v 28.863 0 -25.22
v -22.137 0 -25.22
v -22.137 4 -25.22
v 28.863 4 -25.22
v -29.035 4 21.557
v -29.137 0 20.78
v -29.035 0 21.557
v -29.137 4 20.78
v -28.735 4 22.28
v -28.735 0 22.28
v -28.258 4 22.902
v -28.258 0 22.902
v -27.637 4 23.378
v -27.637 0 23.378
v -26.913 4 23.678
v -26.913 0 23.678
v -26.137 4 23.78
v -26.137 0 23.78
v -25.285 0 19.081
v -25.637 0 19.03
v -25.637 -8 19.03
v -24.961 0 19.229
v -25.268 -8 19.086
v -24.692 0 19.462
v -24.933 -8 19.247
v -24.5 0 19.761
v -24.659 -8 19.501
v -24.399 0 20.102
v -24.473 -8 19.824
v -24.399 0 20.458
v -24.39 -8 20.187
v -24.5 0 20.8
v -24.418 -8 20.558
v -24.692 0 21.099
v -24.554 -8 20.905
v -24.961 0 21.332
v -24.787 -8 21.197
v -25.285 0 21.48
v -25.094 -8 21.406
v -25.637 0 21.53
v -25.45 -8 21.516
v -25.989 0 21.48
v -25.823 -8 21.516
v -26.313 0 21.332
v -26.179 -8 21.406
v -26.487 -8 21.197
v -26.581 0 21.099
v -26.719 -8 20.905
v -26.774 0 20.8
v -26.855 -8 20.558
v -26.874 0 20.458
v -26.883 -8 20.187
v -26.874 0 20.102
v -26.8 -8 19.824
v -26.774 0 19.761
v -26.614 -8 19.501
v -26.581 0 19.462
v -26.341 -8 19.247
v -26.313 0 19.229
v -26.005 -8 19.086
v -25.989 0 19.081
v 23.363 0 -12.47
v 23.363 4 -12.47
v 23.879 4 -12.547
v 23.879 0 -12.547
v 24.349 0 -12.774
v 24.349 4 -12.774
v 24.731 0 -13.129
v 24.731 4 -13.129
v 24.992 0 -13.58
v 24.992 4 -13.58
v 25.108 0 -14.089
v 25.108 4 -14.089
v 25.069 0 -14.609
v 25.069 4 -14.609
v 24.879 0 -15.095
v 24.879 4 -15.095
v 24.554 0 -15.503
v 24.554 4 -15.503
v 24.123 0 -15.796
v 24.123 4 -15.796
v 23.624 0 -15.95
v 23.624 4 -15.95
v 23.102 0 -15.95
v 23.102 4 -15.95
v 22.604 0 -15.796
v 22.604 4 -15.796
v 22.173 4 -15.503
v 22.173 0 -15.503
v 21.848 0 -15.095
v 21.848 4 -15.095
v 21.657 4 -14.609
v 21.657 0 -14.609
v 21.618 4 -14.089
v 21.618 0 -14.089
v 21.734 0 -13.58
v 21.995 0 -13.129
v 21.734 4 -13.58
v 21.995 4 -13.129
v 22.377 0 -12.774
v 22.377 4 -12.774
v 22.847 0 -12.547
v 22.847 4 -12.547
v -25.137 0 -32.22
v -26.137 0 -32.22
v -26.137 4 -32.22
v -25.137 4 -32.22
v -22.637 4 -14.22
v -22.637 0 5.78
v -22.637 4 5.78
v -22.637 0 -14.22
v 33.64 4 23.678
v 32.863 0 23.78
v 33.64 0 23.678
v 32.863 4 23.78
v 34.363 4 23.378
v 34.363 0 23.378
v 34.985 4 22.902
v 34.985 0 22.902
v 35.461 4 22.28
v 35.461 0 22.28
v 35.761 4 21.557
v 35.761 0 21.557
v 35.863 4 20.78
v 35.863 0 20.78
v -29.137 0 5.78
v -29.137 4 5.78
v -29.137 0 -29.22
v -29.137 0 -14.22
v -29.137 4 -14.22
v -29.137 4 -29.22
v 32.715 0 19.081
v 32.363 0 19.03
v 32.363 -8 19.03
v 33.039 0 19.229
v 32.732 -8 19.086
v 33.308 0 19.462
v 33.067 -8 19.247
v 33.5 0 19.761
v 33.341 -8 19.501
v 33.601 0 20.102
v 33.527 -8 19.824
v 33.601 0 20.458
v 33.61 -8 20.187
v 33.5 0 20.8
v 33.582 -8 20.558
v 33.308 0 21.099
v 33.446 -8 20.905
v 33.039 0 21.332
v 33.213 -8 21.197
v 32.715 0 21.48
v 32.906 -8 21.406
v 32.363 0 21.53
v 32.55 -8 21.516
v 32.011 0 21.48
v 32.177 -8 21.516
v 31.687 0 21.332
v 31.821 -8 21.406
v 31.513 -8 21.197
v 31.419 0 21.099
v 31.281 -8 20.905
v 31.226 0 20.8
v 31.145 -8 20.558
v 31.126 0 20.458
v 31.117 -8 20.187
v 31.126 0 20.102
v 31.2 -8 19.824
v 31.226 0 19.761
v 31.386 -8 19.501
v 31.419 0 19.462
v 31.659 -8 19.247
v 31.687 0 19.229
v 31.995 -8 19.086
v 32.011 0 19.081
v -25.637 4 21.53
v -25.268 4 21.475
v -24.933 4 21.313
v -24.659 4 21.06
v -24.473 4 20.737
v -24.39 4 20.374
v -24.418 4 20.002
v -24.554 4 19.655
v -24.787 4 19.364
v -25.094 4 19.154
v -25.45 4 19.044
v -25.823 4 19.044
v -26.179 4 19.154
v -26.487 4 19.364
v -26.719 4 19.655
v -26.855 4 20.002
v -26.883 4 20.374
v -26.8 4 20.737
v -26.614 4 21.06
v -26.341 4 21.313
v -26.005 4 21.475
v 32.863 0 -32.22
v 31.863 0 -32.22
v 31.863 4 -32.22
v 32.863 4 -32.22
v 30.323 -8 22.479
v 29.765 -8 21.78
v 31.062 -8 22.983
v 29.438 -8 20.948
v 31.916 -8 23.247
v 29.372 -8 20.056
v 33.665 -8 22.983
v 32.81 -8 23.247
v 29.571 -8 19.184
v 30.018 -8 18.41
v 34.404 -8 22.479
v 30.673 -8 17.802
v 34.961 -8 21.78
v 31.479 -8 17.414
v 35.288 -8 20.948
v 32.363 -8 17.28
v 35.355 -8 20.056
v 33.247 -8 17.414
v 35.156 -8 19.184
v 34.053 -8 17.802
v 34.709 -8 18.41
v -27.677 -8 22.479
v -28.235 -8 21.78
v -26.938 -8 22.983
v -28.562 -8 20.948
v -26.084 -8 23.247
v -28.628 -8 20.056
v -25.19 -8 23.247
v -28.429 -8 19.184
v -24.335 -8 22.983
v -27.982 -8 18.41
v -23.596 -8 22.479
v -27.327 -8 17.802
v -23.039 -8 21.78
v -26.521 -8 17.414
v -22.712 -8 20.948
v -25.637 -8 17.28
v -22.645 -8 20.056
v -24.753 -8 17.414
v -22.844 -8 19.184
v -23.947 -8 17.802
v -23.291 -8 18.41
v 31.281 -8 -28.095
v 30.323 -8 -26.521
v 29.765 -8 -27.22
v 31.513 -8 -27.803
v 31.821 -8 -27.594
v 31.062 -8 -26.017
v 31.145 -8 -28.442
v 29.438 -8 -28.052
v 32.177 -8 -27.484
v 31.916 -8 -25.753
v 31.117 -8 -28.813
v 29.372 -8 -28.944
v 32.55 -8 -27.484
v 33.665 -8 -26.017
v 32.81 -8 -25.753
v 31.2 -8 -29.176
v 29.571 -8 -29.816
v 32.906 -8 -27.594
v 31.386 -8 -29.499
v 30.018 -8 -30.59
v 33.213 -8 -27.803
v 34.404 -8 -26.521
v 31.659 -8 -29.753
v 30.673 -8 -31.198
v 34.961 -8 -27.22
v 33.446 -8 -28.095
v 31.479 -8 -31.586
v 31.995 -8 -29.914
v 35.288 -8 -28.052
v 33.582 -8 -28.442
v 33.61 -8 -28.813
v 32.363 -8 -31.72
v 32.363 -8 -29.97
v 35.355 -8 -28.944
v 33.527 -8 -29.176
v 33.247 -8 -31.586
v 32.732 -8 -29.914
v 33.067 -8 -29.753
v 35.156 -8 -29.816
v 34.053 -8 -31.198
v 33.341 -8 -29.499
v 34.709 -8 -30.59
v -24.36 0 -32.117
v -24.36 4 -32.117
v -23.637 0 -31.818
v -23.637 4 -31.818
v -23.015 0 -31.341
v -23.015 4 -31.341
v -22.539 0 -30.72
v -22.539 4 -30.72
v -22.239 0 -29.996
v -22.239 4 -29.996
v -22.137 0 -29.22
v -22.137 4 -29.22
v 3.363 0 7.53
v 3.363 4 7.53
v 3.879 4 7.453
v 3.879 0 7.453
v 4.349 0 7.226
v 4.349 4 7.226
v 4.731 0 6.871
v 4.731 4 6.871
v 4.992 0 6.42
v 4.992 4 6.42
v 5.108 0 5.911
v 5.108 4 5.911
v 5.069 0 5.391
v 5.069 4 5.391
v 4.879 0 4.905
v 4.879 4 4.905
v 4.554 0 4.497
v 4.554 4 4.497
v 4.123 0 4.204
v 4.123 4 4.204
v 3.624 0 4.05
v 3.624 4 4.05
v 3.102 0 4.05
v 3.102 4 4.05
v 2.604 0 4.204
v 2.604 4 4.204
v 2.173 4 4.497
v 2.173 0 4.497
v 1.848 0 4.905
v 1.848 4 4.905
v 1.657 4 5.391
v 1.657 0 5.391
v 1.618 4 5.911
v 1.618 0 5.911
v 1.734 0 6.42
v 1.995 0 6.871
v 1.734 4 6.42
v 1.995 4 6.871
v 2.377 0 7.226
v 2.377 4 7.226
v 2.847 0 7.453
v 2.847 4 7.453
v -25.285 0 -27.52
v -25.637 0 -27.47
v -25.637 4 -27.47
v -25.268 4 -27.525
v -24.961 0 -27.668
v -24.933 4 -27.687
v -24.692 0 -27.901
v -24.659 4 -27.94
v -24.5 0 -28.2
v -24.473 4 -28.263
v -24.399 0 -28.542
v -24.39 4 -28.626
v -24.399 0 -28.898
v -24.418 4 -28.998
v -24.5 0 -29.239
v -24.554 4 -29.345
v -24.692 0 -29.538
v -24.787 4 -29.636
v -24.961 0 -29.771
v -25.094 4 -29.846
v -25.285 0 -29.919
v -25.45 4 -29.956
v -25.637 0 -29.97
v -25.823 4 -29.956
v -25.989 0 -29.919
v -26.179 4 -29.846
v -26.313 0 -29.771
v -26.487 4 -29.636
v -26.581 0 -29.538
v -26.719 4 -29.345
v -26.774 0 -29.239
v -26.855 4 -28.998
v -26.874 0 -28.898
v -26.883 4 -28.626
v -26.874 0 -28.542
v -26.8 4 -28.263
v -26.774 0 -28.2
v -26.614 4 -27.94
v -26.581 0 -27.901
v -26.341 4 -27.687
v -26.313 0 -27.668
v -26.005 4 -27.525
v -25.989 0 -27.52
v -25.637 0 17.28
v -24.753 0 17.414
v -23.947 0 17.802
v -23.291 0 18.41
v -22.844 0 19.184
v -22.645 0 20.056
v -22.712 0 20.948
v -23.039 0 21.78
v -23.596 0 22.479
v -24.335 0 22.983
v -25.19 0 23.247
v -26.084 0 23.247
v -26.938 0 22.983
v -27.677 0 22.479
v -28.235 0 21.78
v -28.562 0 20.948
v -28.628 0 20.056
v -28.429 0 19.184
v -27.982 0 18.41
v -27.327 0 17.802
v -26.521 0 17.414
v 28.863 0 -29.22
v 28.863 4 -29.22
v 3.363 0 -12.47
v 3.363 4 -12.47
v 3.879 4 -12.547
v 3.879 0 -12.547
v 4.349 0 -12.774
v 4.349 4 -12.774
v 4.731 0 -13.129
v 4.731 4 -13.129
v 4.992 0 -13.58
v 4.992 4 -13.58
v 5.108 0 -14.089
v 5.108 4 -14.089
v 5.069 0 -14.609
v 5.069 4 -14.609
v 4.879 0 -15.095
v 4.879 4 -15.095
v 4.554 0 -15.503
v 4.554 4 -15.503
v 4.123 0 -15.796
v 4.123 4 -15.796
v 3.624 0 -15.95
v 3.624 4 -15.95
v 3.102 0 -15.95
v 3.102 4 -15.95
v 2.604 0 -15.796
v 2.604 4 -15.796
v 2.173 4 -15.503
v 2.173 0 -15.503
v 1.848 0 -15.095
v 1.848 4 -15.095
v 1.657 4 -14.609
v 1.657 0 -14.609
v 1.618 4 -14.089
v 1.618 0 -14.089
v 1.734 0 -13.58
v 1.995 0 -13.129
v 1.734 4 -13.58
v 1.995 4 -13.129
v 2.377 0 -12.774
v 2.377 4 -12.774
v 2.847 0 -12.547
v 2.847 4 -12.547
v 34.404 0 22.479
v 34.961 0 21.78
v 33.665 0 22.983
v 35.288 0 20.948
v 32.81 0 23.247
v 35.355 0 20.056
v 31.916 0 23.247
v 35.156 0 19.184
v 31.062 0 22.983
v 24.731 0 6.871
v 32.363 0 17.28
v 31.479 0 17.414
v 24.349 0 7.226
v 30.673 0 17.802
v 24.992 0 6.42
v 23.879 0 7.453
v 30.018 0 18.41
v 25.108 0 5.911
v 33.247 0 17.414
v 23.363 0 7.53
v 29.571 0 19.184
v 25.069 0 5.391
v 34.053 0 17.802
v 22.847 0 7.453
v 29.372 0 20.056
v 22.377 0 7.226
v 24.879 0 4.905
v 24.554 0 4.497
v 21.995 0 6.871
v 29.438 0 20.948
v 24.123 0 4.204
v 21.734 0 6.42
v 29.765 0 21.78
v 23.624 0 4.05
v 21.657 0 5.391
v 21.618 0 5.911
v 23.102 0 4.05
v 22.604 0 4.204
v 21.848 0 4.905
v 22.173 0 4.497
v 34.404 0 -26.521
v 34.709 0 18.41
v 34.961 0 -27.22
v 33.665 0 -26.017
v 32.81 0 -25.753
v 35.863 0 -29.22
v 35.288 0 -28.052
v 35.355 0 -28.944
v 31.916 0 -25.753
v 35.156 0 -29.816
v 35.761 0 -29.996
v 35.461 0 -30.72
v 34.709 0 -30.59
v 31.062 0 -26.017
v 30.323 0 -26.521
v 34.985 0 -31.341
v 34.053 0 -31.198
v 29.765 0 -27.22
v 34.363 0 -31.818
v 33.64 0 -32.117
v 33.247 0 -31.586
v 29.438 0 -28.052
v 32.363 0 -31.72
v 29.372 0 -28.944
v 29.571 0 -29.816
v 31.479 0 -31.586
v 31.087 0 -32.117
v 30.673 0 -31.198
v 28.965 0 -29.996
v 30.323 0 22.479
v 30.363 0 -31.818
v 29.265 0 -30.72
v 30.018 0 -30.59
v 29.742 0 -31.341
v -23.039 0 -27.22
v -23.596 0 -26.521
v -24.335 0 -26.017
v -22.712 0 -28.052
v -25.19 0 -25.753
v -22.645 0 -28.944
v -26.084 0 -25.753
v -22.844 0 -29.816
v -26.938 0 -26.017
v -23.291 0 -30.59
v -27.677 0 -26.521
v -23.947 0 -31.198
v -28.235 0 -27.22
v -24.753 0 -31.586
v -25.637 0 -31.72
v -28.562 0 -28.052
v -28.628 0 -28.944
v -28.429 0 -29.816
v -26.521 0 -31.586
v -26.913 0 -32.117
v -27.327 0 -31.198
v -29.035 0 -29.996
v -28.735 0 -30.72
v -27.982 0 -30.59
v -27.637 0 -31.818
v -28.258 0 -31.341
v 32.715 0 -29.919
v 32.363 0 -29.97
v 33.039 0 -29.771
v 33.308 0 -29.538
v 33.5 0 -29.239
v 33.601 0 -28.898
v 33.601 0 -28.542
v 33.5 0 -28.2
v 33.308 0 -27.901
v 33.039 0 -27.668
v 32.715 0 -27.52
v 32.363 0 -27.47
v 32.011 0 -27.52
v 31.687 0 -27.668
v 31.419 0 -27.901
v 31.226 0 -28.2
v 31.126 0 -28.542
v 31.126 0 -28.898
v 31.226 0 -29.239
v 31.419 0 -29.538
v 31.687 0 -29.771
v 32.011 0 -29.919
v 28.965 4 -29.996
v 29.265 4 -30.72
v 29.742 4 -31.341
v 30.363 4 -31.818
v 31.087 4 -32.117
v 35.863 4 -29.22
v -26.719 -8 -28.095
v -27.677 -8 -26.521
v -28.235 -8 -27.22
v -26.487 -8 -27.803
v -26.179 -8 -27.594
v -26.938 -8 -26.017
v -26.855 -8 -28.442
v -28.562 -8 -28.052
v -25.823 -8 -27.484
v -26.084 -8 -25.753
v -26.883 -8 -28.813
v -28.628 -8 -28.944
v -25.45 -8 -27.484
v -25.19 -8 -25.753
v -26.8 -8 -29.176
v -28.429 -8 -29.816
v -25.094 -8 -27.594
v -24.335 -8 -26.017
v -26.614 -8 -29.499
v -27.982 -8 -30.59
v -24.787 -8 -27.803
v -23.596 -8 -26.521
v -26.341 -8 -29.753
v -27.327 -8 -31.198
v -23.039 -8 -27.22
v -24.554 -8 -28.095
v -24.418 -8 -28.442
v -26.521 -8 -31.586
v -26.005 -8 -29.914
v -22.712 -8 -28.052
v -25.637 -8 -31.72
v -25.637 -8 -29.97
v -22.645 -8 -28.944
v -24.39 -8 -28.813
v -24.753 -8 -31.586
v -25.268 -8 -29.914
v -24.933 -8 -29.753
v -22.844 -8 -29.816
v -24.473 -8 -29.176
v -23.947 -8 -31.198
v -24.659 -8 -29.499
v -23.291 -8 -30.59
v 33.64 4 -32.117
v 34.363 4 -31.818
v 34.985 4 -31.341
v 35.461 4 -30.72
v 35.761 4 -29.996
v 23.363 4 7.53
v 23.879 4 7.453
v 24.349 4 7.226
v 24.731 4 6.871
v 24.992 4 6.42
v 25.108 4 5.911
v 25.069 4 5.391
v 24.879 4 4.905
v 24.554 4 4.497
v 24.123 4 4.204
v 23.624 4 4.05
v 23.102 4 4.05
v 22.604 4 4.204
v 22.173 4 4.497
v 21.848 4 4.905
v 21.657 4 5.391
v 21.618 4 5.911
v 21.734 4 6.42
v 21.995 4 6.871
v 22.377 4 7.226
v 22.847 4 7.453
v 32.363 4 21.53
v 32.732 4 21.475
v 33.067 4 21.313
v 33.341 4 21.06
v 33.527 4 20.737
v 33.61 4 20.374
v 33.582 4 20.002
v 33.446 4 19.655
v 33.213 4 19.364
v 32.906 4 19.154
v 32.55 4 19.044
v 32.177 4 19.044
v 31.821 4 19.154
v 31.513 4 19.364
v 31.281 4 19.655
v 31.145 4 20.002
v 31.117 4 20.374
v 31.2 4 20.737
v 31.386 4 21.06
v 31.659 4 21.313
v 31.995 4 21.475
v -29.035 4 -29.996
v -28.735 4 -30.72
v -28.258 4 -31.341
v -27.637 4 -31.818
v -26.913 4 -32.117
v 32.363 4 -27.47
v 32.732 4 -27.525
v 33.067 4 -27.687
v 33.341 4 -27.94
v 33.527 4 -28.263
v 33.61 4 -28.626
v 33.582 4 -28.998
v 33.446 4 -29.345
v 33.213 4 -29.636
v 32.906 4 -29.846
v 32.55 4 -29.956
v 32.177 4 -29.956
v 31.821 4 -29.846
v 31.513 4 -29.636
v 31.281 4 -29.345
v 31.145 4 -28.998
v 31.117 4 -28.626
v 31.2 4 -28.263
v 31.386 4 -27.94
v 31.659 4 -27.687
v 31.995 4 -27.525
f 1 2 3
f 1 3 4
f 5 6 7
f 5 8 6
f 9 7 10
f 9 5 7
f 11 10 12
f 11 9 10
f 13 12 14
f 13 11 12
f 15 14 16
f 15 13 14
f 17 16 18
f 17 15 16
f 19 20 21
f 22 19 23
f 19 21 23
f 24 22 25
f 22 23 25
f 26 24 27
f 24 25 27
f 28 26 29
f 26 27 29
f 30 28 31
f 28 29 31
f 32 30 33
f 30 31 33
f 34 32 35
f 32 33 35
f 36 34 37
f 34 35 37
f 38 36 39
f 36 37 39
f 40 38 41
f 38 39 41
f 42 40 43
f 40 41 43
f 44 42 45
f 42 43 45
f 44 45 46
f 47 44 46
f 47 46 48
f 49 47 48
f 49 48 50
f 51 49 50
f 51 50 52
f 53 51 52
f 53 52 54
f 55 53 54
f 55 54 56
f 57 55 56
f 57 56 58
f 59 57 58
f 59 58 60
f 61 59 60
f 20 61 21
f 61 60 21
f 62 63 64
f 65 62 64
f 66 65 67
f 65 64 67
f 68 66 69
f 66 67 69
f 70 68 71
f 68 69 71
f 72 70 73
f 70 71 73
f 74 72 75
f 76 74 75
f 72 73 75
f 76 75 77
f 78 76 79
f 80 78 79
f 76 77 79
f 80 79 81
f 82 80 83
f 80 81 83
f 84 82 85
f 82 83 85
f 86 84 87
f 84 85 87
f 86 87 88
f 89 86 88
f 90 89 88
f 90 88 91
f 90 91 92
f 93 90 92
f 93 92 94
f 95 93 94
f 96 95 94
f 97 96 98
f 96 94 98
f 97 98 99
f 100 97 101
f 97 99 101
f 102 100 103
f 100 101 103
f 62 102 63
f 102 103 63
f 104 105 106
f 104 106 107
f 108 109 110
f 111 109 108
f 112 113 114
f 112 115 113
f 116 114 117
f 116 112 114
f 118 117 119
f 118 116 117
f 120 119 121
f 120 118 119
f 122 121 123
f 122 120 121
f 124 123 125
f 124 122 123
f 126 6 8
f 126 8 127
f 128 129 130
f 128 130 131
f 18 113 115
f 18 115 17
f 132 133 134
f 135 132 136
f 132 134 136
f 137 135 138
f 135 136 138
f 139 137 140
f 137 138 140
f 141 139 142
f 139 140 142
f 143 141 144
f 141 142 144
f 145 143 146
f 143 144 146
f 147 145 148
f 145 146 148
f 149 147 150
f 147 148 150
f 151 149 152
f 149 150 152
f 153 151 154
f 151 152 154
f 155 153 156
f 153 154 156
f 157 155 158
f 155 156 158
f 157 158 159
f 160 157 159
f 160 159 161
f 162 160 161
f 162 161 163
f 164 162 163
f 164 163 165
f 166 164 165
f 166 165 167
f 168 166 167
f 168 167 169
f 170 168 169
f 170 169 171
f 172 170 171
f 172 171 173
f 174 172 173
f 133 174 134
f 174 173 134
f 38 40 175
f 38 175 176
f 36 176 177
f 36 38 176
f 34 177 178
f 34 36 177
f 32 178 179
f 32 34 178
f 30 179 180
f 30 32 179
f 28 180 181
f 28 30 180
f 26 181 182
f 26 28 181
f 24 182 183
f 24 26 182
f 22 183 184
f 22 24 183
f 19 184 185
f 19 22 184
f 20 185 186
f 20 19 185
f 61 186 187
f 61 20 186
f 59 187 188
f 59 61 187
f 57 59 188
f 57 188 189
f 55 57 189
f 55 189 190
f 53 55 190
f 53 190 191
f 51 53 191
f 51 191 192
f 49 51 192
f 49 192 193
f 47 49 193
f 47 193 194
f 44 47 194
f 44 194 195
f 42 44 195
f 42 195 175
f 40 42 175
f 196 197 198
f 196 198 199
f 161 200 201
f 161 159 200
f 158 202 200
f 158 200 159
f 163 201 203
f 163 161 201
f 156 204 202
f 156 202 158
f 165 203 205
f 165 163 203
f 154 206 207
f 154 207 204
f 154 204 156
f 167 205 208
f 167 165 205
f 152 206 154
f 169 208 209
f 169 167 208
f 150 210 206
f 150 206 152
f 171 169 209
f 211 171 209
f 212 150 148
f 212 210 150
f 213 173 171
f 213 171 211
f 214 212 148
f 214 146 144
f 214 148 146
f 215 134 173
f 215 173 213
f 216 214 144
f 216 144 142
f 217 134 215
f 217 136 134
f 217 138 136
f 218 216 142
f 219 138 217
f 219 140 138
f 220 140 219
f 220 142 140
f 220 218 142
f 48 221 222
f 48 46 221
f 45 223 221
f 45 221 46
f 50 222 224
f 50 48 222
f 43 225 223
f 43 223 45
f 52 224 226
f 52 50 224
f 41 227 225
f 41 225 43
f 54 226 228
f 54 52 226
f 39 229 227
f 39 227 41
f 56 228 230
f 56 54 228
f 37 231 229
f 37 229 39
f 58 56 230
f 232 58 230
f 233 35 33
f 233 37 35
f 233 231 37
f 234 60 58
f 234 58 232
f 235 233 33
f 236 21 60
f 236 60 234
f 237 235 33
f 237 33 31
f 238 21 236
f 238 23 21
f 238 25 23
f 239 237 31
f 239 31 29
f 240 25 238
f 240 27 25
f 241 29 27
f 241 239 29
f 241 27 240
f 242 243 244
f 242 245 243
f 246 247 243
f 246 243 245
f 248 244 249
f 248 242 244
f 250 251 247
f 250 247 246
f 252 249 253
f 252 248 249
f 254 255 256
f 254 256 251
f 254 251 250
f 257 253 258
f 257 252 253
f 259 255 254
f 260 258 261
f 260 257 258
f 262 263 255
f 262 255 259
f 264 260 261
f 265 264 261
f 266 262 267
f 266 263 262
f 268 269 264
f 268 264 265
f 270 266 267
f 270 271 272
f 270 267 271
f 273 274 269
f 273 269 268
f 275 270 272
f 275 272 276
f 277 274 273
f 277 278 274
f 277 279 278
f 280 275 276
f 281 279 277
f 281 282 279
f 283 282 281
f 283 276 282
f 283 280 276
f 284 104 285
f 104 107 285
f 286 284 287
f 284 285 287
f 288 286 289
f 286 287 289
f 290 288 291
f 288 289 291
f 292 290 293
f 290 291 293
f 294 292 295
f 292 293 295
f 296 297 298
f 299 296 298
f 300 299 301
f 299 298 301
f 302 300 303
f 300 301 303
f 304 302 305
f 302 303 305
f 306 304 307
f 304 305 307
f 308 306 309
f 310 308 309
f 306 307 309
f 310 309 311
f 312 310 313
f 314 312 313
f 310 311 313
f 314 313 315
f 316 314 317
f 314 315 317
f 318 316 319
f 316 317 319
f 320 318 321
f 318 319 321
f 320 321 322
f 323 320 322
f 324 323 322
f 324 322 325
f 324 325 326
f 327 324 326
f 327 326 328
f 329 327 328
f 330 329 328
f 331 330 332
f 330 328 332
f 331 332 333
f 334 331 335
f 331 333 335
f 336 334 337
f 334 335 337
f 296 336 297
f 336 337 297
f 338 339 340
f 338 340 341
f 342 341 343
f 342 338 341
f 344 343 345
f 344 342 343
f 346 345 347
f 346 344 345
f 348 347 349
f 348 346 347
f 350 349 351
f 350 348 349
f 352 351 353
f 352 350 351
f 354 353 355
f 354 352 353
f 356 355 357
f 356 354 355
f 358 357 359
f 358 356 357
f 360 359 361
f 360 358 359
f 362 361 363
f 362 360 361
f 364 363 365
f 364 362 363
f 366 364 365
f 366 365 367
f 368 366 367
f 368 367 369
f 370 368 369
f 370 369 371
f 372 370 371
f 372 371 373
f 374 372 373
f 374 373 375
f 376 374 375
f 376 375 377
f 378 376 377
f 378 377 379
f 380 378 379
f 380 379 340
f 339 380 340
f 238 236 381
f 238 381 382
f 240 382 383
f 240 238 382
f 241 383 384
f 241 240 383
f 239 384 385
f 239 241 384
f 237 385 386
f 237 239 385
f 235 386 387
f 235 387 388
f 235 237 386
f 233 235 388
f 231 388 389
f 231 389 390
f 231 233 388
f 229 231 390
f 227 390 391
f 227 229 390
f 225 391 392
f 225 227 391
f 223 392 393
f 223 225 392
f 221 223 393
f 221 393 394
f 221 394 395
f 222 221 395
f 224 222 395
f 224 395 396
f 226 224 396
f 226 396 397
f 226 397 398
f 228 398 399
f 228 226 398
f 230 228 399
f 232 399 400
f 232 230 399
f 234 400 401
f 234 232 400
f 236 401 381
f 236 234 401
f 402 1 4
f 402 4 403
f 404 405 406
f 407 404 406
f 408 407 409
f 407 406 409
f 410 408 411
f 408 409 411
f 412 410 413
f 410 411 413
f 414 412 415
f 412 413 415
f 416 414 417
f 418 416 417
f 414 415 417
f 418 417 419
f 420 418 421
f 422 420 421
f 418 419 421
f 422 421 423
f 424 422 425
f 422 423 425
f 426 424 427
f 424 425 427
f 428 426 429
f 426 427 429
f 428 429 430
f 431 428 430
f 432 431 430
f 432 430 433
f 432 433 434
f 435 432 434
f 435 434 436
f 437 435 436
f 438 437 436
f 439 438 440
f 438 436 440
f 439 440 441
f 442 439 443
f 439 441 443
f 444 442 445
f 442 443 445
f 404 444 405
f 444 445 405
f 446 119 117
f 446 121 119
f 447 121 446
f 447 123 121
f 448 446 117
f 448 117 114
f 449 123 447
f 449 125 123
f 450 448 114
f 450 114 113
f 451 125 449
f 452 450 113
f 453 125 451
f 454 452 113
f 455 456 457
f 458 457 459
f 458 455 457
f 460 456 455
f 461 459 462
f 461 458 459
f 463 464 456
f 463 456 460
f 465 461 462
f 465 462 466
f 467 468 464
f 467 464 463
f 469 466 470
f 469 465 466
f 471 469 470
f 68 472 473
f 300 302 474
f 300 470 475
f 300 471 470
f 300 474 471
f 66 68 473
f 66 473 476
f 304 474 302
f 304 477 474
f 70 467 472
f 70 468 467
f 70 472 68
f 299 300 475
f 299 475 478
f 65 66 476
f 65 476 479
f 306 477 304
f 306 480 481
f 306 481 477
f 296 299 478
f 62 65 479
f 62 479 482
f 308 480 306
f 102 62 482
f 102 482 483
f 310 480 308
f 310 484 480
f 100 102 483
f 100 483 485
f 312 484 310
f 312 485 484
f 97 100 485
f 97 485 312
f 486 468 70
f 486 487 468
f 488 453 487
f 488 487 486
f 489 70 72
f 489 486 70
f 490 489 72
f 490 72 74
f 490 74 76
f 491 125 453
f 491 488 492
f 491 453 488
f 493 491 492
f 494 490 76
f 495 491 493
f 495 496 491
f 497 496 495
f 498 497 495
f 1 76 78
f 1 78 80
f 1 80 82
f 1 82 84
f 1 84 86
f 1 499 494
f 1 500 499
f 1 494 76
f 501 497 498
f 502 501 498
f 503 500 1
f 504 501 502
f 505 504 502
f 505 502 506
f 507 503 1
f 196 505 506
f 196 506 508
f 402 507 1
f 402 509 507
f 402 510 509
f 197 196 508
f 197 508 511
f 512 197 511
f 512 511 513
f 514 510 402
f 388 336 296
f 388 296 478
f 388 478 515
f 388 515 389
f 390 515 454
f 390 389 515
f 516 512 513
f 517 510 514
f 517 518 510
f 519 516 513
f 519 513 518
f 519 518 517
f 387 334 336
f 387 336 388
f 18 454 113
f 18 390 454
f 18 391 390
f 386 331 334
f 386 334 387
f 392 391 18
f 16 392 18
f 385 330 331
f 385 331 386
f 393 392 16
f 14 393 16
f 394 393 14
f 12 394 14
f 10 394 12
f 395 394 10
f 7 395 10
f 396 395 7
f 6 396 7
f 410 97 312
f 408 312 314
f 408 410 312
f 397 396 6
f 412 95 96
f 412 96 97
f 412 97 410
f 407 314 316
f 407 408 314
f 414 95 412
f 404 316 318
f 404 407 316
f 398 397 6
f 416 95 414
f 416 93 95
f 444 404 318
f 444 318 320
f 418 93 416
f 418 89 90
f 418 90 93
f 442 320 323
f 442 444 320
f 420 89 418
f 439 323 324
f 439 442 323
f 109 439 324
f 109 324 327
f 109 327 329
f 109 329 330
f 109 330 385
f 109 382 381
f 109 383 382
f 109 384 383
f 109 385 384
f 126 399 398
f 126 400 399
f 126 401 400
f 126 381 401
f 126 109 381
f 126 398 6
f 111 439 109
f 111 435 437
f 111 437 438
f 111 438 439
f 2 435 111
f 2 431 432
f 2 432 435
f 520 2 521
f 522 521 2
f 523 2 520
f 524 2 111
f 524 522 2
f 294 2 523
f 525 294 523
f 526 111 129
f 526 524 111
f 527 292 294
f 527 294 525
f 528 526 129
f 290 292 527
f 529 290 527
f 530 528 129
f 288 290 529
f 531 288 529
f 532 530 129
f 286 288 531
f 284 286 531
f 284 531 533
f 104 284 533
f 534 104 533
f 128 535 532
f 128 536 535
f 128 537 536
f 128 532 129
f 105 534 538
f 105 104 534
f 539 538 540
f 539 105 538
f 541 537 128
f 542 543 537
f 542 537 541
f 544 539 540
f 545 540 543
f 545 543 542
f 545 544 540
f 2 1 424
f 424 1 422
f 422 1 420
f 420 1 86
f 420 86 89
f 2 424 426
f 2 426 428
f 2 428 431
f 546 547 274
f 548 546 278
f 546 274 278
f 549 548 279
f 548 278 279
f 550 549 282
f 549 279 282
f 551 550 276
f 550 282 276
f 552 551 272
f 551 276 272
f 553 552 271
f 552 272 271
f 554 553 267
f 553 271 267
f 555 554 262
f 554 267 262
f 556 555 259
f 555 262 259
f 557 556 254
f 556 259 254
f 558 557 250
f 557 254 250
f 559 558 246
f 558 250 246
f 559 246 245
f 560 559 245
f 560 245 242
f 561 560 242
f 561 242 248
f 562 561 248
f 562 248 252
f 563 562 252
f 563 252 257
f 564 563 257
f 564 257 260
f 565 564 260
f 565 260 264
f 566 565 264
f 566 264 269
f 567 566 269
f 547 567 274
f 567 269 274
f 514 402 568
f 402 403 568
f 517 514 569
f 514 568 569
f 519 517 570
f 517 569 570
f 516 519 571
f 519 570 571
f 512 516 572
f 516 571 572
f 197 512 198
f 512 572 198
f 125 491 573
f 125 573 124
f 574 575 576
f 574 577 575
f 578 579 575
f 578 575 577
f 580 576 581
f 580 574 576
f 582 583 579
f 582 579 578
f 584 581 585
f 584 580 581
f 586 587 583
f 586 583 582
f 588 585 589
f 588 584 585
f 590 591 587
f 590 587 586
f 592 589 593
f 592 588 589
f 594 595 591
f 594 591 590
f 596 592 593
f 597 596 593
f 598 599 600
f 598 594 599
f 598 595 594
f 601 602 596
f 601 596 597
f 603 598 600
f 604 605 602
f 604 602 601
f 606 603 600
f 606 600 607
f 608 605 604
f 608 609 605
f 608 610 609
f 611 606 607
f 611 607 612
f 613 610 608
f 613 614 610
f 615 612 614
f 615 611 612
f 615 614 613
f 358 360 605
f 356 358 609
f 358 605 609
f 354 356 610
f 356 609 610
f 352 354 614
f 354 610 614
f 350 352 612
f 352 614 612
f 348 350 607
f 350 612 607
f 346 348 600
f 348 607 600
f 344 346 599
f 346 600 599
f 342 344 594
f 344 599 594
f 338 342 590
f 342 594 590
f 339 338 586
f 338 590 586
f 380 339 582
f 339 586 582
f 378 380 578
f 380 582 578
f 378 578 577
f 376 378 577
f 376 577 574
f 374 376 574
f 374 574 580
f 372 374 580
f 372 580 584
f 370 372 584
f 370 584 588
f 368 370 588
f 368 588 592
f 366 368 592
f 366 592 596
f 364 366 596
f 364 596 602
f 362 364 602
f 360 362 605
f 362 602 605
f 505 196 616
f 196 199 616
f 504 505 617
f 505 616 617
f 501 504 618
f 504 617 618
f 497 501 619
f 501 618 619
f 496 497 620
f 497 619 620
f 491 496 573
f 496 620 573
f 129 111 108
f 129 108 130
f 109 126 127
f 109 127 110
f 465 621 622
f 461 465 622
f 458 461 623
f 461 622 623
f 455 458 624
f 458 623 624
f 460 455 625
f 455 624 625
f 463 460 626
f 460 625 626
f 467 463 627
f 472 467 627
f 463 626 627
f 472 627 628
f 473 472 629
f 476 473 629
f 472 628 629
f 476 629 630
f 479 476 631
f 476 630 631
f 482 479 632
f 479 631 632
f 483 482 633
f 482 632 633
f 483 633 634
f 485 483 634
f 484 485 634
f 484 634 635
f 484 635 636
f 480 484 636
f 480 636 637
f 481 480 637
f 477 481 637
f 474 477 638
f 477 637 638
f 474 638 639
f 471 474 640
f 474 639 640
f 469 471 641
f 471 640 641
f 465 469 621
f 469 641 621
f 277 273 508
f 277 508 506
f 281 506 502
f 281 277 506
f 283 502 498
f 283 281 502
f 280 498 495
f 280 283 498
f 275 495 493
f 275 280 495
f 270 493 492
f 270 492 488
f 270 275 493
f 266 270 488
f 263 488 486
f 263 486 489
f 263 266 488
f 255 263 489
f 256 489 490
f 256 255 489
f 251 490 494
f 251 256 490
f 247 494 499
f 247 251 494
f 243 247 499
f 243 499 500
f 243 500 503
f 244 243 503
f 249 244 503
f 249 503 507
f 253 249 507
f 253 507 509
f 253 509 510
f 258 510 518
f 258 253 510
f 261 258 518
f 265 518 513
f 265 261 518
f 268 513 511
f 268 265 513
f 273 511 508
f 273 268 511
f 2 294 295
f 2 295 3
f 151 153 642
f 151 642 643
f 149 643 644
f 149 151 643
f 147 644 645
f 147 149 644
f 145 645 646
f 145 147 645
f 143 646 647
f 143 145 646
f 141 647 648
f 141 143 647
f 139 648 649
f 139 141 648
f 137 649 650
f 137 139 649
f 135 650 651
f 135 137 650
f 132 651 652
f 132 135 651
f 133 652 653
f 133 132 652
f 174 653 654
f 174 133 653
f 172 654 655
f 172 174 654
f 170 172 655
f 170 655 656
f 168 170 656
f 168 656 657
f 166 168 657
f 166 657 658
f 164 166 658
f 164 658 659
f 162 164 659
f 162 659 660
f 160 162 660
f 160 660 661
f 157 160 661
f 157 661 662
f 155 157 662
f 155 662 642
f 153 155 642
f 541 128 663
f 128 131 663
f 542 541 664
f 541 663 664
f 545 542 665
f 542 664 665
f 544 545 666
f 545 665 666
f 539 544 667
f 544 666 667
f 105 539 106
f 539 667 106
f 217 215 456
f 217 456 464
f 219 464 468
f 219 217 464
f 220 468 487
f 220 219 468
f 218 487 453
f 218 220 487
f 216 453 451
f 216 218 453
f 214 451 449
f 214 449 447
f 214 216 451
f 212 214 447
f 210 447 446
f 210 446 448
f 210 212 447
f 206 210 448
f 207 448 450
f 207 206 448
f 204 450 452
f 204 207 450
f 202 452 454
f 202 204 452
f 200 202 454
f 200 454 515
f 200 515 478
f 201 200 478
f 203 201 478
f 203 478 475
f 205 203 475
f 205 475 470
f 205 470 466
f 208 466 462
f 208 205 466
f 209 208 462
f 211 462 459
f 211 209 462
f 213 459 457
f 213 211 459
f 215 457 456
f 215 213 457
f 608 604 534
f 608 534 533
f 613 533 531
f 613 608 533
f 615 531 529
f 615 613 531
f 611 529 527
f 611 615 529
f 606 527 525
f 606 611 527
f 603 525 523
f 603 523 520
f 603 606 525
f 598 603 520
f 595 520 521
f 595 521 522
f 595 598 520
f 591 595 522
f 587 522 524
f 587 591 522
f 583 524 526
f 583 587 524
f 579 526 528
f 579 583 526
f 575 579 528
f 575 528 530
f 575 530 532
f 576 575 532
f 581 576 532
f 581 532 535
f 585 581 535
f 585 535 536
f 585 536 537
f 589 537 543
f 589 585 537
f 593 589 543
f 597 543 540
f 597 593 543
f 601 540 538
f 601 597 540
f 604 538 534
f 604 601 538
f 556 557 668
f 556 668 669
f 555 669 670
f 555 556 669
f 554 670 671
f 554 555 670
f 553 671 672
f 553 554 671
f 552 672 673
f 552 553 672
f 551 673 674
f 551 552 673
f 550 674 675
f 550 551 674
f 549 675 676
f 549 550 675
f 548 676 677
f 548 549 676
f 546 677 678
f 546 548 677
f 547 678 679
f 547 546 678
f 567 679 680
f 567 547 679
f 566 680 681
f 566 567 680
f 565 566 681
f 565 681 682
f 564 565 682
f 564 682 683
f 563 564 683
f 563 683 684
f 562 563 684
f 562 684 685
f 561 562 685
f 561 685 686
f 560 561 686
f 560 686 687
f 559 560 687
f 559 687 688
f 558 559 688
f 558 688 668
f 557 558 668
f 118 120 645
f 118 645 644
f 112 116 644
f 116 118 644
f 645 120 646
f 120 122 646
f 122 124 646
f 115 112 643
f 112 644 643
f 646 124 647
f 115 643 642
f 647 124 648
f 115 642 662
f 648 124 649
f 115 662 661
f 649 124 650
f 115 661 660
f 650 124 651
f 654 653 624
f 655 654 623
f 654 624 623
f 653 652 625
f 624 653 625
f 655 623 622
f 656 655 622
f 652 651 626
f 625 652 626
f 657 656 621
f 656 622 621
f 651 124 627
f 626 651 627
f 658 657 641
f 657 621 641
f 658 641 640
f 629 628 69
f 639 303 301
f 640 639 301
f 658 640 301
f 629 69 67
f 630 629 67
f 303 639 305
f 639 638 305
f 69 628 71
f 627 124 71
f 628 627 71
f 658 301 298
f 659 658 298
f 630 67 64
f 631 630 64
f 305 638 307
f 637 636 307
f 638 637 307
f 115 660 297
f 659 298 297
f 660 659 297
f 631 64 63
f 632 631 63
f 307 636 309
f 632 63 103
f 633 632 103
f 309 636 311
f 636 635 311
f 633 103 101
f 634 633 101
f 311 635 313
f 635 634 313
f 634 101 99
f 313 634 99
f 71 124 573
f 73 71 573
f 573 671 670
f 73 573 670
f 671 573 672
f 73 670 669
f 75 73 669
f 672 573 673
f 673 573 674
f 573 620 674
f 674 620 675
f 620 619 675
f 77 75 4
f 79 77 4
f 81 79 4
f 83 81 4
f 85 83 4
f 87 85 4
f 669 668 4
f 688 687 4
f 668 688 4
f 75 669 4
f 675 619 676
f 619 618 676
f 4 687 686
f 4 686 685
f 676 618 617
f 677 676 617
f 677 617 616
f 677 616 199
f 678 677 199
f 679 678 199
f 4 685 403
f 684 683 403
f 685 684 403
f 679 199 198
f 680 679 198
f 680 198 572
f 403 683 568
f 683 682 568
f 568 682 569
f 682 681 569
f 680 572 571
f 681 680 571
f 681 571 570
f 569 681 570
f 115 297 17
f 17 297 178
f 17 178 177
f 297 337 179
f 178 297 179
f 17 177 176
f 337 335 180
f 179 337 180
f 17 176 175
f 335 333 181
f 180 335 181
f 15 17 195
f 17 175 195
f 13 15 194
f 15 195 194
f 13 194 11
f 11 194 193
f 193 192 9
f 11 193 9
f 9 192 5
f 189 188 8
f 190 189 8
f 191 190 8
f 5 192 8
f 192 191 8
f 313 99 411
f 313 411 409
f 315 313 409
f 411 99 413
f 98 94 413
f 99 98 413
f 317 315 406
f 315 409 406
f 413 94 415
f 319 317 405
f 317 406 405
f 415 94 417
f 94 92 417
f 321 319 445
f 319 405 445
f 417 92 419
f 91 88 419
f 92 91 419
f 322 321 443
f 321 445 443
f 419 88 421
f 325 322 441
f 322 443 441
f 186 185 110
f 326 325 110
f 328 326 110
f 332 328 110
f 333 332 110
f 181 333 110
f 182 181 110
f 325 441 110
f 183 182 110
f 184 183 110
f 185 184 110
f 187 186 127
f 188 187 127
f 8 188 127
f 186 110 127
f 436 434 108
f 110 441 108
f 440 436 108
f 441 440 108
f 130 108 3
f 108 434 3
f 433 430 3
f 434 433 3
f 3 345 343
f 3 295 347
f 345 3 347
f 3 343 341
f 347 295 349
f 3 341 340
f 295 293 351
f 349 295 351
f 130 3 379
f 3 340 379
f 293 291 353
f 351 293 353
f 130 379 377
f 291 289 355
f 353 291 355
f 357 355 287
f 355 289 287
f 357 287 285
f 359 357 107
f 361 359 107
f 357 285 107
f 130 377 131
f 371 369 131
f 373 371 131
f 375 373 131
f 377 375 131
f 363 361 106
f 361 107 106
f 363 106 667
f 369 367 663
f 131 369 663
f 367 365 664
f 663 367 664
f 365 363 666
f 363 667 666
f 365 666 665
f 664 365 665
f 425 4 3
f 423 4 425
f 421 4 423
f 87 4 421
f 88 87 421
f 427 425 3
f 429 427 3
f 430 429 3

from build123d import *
from build123d.topology import SkipClean

# Parameters (mm, degrees)
SKETCH1_R           = 1.25
BOSS_EXTRUDE1_DEPTH = 4
FILLET1_R           = 3
SKETCH2_R           = 1.75
CUT_EXTRUDE1_DEPTH  = 4
BOSS_EXTRUDE2_START = 8
SKETCH3_R           = 3
SKETCH3_R_2         = 1.25
BOSS_EXTRUDE2_DEPTH = 8


with BuildPart() as part:
    # Sketch1 → Boss-Extrude1 (new body)
    with BuildSketch(Plane(origin=(0, 0, 0), x_dir=(1, 0, 0), z_dir=(0, 1, 0))):
        Polygon((-29.136771411, 14.21972047), (-29.136771411, 32.21972047), (-22.136771411, 32.21972047), (-22.136771411, 25.21972047), (28.863228589, 25.21972047), (28.863228589, 32.21972047), (35.863228589, 32.21972047), (35.863228589, -23.78027953), (-29.136771411, -23.78027953), (-29.136771411, -5.78027953), (-22.636771411, -5.78027953), (-22.636771411, 14.21972047), align=None)
        with Locations(Location((32.363228589, 28.71972047, 0), (0, 0, 270))):
            Circle(SKETCH1_R, mode=Mode.SUBTRACT)
        with Locations(Location((-25.636771411, 28.71972047, 0), (0, 0, 270))):
            Circle(SKETCH1_R, mode=Mode.SUBTRACT)
        with Locations(Location((32.363228589, -20.28027953, 0), (0, 0, 270))):
            Circle(SKETCH1_R, mode=Mode.SUBTRACT)
        with Locations(Location((-25.636771411, -20.28027953, 0), (0, 0, 270))):
            Circle(SKETCH1_R, mode=Mode.SUBTRACT)
    extrude(amount=BOSS_EXTRUDE1_DEPTH)

    # Fillet1
    fillet1_edges = [part.edges().sort_by_distance(p)[0] for p in [
        (-22.136771411, 2, -32.21972047),
        (28.863228589, 2, -32.21972047),
        (35.863228589, 2, -32.21972047),
        (35.863228589, 2, 23.78027953),
        (-29.136771411, 2, 23.78027953),
        (-29.136771411, 2, -32.21972047),
    ]]
    fillet(fillet1_edges, radius=FILLET1_R)

    # Sketch2 → Cut-Extrude1 (cut)
    with BuildSketch(Plane(origin=(0, 4, 0), x_dir=(1, 0, 0), z_dir=(0, 1, 0))):
        with Locations(Location((23.363228589, 14.21972047, 0), (0, 0, 270))):
            Circle(SKETCH2_R)
        with Locations(Location((3.363228589, 14.21972047, 0), (0, 0, 270))):
            Circle(SKETCH2_R)
        with Locations(Location((3.363228589, -5.78027953, 0), (0, 0, 270))):
            Circle(SKETCH2_R)
        with Locations(Location((23.363228589, -5.78027953, 0), (0, 0, 270))):
            Circle(SKETCH2_R)
    extrude(amount=-CUT_EXTRUDE1_DEPTH, mode=Mode.SUBTRACT)

    # Sketch3 → Boss-Extrude2 (add)
    # profile 1 of 4: a face of its own
    with SkipClean():  # the faces are left unmerged after this step: merging them gives an invalid solid
        with BuildSketch(Plane.XZ.offset(BOSS_EXTRUDE2_START)):
            with Locations(Location((-25.636771411, 20.28027953, 0), (0, 0, 270))):
                Circle(SKETCH3_R)
            with Locations(Location((-25.636771411, 20.28027953, 0), (0, 0, 270))):
                Circle(SKETCH3_R_2, mode=Mode.SUBTRACT)
        # profile 2 of 4: a face of its own
        with BuildSketch(Plane.XZ.offset(BOSS_EXTRUDE2_START)):
            with Locations(Location((-25.636771411, -28.71972047, 0), (0, 0, 270))):
                Circle(SKETCH3_R)
            with Locations(Location((-25.636771411, -28.71972047, 0), (0, 0, 270))):
                Circle(SKETCH3_R_2, mode=Mode.SUBTRACT)
        # profile 3 of 4: a face of its own
        with BuildSketch(Plane.XZ.offset(BOSS_EXTRUDE2_START)):
            with Locations(Location((32.363228589, -28.71972047, 0), (0, 0, 270))):
                Circle(SKETCH3_R)
            with Locations(Location((32.363228589, -28.71972047, 0), (0, 0, 270))):
                Circle(SKETCH3_R_2, mode=Mode.SUBTRACT)
        # profile 4 of 4: a face of its own
        with BuildSketch(Plane.XZ.offset(BOSS_EXTRUDE2_START)):
            with Locations(Location((32.363228589, 20.28027953, 0), (0, 0, 270))):
                Circle(SKETCH3_R)
            with Locations(Location((32.363228589, 20.28027953, 0), (0, 0, 270))):
                Circle(SKETCH3_R_2, mode=Mode.SUBTRACT)
        extrude(amount=-BOSS_EXTRUDE2_DEPTH)


solid = part.part
